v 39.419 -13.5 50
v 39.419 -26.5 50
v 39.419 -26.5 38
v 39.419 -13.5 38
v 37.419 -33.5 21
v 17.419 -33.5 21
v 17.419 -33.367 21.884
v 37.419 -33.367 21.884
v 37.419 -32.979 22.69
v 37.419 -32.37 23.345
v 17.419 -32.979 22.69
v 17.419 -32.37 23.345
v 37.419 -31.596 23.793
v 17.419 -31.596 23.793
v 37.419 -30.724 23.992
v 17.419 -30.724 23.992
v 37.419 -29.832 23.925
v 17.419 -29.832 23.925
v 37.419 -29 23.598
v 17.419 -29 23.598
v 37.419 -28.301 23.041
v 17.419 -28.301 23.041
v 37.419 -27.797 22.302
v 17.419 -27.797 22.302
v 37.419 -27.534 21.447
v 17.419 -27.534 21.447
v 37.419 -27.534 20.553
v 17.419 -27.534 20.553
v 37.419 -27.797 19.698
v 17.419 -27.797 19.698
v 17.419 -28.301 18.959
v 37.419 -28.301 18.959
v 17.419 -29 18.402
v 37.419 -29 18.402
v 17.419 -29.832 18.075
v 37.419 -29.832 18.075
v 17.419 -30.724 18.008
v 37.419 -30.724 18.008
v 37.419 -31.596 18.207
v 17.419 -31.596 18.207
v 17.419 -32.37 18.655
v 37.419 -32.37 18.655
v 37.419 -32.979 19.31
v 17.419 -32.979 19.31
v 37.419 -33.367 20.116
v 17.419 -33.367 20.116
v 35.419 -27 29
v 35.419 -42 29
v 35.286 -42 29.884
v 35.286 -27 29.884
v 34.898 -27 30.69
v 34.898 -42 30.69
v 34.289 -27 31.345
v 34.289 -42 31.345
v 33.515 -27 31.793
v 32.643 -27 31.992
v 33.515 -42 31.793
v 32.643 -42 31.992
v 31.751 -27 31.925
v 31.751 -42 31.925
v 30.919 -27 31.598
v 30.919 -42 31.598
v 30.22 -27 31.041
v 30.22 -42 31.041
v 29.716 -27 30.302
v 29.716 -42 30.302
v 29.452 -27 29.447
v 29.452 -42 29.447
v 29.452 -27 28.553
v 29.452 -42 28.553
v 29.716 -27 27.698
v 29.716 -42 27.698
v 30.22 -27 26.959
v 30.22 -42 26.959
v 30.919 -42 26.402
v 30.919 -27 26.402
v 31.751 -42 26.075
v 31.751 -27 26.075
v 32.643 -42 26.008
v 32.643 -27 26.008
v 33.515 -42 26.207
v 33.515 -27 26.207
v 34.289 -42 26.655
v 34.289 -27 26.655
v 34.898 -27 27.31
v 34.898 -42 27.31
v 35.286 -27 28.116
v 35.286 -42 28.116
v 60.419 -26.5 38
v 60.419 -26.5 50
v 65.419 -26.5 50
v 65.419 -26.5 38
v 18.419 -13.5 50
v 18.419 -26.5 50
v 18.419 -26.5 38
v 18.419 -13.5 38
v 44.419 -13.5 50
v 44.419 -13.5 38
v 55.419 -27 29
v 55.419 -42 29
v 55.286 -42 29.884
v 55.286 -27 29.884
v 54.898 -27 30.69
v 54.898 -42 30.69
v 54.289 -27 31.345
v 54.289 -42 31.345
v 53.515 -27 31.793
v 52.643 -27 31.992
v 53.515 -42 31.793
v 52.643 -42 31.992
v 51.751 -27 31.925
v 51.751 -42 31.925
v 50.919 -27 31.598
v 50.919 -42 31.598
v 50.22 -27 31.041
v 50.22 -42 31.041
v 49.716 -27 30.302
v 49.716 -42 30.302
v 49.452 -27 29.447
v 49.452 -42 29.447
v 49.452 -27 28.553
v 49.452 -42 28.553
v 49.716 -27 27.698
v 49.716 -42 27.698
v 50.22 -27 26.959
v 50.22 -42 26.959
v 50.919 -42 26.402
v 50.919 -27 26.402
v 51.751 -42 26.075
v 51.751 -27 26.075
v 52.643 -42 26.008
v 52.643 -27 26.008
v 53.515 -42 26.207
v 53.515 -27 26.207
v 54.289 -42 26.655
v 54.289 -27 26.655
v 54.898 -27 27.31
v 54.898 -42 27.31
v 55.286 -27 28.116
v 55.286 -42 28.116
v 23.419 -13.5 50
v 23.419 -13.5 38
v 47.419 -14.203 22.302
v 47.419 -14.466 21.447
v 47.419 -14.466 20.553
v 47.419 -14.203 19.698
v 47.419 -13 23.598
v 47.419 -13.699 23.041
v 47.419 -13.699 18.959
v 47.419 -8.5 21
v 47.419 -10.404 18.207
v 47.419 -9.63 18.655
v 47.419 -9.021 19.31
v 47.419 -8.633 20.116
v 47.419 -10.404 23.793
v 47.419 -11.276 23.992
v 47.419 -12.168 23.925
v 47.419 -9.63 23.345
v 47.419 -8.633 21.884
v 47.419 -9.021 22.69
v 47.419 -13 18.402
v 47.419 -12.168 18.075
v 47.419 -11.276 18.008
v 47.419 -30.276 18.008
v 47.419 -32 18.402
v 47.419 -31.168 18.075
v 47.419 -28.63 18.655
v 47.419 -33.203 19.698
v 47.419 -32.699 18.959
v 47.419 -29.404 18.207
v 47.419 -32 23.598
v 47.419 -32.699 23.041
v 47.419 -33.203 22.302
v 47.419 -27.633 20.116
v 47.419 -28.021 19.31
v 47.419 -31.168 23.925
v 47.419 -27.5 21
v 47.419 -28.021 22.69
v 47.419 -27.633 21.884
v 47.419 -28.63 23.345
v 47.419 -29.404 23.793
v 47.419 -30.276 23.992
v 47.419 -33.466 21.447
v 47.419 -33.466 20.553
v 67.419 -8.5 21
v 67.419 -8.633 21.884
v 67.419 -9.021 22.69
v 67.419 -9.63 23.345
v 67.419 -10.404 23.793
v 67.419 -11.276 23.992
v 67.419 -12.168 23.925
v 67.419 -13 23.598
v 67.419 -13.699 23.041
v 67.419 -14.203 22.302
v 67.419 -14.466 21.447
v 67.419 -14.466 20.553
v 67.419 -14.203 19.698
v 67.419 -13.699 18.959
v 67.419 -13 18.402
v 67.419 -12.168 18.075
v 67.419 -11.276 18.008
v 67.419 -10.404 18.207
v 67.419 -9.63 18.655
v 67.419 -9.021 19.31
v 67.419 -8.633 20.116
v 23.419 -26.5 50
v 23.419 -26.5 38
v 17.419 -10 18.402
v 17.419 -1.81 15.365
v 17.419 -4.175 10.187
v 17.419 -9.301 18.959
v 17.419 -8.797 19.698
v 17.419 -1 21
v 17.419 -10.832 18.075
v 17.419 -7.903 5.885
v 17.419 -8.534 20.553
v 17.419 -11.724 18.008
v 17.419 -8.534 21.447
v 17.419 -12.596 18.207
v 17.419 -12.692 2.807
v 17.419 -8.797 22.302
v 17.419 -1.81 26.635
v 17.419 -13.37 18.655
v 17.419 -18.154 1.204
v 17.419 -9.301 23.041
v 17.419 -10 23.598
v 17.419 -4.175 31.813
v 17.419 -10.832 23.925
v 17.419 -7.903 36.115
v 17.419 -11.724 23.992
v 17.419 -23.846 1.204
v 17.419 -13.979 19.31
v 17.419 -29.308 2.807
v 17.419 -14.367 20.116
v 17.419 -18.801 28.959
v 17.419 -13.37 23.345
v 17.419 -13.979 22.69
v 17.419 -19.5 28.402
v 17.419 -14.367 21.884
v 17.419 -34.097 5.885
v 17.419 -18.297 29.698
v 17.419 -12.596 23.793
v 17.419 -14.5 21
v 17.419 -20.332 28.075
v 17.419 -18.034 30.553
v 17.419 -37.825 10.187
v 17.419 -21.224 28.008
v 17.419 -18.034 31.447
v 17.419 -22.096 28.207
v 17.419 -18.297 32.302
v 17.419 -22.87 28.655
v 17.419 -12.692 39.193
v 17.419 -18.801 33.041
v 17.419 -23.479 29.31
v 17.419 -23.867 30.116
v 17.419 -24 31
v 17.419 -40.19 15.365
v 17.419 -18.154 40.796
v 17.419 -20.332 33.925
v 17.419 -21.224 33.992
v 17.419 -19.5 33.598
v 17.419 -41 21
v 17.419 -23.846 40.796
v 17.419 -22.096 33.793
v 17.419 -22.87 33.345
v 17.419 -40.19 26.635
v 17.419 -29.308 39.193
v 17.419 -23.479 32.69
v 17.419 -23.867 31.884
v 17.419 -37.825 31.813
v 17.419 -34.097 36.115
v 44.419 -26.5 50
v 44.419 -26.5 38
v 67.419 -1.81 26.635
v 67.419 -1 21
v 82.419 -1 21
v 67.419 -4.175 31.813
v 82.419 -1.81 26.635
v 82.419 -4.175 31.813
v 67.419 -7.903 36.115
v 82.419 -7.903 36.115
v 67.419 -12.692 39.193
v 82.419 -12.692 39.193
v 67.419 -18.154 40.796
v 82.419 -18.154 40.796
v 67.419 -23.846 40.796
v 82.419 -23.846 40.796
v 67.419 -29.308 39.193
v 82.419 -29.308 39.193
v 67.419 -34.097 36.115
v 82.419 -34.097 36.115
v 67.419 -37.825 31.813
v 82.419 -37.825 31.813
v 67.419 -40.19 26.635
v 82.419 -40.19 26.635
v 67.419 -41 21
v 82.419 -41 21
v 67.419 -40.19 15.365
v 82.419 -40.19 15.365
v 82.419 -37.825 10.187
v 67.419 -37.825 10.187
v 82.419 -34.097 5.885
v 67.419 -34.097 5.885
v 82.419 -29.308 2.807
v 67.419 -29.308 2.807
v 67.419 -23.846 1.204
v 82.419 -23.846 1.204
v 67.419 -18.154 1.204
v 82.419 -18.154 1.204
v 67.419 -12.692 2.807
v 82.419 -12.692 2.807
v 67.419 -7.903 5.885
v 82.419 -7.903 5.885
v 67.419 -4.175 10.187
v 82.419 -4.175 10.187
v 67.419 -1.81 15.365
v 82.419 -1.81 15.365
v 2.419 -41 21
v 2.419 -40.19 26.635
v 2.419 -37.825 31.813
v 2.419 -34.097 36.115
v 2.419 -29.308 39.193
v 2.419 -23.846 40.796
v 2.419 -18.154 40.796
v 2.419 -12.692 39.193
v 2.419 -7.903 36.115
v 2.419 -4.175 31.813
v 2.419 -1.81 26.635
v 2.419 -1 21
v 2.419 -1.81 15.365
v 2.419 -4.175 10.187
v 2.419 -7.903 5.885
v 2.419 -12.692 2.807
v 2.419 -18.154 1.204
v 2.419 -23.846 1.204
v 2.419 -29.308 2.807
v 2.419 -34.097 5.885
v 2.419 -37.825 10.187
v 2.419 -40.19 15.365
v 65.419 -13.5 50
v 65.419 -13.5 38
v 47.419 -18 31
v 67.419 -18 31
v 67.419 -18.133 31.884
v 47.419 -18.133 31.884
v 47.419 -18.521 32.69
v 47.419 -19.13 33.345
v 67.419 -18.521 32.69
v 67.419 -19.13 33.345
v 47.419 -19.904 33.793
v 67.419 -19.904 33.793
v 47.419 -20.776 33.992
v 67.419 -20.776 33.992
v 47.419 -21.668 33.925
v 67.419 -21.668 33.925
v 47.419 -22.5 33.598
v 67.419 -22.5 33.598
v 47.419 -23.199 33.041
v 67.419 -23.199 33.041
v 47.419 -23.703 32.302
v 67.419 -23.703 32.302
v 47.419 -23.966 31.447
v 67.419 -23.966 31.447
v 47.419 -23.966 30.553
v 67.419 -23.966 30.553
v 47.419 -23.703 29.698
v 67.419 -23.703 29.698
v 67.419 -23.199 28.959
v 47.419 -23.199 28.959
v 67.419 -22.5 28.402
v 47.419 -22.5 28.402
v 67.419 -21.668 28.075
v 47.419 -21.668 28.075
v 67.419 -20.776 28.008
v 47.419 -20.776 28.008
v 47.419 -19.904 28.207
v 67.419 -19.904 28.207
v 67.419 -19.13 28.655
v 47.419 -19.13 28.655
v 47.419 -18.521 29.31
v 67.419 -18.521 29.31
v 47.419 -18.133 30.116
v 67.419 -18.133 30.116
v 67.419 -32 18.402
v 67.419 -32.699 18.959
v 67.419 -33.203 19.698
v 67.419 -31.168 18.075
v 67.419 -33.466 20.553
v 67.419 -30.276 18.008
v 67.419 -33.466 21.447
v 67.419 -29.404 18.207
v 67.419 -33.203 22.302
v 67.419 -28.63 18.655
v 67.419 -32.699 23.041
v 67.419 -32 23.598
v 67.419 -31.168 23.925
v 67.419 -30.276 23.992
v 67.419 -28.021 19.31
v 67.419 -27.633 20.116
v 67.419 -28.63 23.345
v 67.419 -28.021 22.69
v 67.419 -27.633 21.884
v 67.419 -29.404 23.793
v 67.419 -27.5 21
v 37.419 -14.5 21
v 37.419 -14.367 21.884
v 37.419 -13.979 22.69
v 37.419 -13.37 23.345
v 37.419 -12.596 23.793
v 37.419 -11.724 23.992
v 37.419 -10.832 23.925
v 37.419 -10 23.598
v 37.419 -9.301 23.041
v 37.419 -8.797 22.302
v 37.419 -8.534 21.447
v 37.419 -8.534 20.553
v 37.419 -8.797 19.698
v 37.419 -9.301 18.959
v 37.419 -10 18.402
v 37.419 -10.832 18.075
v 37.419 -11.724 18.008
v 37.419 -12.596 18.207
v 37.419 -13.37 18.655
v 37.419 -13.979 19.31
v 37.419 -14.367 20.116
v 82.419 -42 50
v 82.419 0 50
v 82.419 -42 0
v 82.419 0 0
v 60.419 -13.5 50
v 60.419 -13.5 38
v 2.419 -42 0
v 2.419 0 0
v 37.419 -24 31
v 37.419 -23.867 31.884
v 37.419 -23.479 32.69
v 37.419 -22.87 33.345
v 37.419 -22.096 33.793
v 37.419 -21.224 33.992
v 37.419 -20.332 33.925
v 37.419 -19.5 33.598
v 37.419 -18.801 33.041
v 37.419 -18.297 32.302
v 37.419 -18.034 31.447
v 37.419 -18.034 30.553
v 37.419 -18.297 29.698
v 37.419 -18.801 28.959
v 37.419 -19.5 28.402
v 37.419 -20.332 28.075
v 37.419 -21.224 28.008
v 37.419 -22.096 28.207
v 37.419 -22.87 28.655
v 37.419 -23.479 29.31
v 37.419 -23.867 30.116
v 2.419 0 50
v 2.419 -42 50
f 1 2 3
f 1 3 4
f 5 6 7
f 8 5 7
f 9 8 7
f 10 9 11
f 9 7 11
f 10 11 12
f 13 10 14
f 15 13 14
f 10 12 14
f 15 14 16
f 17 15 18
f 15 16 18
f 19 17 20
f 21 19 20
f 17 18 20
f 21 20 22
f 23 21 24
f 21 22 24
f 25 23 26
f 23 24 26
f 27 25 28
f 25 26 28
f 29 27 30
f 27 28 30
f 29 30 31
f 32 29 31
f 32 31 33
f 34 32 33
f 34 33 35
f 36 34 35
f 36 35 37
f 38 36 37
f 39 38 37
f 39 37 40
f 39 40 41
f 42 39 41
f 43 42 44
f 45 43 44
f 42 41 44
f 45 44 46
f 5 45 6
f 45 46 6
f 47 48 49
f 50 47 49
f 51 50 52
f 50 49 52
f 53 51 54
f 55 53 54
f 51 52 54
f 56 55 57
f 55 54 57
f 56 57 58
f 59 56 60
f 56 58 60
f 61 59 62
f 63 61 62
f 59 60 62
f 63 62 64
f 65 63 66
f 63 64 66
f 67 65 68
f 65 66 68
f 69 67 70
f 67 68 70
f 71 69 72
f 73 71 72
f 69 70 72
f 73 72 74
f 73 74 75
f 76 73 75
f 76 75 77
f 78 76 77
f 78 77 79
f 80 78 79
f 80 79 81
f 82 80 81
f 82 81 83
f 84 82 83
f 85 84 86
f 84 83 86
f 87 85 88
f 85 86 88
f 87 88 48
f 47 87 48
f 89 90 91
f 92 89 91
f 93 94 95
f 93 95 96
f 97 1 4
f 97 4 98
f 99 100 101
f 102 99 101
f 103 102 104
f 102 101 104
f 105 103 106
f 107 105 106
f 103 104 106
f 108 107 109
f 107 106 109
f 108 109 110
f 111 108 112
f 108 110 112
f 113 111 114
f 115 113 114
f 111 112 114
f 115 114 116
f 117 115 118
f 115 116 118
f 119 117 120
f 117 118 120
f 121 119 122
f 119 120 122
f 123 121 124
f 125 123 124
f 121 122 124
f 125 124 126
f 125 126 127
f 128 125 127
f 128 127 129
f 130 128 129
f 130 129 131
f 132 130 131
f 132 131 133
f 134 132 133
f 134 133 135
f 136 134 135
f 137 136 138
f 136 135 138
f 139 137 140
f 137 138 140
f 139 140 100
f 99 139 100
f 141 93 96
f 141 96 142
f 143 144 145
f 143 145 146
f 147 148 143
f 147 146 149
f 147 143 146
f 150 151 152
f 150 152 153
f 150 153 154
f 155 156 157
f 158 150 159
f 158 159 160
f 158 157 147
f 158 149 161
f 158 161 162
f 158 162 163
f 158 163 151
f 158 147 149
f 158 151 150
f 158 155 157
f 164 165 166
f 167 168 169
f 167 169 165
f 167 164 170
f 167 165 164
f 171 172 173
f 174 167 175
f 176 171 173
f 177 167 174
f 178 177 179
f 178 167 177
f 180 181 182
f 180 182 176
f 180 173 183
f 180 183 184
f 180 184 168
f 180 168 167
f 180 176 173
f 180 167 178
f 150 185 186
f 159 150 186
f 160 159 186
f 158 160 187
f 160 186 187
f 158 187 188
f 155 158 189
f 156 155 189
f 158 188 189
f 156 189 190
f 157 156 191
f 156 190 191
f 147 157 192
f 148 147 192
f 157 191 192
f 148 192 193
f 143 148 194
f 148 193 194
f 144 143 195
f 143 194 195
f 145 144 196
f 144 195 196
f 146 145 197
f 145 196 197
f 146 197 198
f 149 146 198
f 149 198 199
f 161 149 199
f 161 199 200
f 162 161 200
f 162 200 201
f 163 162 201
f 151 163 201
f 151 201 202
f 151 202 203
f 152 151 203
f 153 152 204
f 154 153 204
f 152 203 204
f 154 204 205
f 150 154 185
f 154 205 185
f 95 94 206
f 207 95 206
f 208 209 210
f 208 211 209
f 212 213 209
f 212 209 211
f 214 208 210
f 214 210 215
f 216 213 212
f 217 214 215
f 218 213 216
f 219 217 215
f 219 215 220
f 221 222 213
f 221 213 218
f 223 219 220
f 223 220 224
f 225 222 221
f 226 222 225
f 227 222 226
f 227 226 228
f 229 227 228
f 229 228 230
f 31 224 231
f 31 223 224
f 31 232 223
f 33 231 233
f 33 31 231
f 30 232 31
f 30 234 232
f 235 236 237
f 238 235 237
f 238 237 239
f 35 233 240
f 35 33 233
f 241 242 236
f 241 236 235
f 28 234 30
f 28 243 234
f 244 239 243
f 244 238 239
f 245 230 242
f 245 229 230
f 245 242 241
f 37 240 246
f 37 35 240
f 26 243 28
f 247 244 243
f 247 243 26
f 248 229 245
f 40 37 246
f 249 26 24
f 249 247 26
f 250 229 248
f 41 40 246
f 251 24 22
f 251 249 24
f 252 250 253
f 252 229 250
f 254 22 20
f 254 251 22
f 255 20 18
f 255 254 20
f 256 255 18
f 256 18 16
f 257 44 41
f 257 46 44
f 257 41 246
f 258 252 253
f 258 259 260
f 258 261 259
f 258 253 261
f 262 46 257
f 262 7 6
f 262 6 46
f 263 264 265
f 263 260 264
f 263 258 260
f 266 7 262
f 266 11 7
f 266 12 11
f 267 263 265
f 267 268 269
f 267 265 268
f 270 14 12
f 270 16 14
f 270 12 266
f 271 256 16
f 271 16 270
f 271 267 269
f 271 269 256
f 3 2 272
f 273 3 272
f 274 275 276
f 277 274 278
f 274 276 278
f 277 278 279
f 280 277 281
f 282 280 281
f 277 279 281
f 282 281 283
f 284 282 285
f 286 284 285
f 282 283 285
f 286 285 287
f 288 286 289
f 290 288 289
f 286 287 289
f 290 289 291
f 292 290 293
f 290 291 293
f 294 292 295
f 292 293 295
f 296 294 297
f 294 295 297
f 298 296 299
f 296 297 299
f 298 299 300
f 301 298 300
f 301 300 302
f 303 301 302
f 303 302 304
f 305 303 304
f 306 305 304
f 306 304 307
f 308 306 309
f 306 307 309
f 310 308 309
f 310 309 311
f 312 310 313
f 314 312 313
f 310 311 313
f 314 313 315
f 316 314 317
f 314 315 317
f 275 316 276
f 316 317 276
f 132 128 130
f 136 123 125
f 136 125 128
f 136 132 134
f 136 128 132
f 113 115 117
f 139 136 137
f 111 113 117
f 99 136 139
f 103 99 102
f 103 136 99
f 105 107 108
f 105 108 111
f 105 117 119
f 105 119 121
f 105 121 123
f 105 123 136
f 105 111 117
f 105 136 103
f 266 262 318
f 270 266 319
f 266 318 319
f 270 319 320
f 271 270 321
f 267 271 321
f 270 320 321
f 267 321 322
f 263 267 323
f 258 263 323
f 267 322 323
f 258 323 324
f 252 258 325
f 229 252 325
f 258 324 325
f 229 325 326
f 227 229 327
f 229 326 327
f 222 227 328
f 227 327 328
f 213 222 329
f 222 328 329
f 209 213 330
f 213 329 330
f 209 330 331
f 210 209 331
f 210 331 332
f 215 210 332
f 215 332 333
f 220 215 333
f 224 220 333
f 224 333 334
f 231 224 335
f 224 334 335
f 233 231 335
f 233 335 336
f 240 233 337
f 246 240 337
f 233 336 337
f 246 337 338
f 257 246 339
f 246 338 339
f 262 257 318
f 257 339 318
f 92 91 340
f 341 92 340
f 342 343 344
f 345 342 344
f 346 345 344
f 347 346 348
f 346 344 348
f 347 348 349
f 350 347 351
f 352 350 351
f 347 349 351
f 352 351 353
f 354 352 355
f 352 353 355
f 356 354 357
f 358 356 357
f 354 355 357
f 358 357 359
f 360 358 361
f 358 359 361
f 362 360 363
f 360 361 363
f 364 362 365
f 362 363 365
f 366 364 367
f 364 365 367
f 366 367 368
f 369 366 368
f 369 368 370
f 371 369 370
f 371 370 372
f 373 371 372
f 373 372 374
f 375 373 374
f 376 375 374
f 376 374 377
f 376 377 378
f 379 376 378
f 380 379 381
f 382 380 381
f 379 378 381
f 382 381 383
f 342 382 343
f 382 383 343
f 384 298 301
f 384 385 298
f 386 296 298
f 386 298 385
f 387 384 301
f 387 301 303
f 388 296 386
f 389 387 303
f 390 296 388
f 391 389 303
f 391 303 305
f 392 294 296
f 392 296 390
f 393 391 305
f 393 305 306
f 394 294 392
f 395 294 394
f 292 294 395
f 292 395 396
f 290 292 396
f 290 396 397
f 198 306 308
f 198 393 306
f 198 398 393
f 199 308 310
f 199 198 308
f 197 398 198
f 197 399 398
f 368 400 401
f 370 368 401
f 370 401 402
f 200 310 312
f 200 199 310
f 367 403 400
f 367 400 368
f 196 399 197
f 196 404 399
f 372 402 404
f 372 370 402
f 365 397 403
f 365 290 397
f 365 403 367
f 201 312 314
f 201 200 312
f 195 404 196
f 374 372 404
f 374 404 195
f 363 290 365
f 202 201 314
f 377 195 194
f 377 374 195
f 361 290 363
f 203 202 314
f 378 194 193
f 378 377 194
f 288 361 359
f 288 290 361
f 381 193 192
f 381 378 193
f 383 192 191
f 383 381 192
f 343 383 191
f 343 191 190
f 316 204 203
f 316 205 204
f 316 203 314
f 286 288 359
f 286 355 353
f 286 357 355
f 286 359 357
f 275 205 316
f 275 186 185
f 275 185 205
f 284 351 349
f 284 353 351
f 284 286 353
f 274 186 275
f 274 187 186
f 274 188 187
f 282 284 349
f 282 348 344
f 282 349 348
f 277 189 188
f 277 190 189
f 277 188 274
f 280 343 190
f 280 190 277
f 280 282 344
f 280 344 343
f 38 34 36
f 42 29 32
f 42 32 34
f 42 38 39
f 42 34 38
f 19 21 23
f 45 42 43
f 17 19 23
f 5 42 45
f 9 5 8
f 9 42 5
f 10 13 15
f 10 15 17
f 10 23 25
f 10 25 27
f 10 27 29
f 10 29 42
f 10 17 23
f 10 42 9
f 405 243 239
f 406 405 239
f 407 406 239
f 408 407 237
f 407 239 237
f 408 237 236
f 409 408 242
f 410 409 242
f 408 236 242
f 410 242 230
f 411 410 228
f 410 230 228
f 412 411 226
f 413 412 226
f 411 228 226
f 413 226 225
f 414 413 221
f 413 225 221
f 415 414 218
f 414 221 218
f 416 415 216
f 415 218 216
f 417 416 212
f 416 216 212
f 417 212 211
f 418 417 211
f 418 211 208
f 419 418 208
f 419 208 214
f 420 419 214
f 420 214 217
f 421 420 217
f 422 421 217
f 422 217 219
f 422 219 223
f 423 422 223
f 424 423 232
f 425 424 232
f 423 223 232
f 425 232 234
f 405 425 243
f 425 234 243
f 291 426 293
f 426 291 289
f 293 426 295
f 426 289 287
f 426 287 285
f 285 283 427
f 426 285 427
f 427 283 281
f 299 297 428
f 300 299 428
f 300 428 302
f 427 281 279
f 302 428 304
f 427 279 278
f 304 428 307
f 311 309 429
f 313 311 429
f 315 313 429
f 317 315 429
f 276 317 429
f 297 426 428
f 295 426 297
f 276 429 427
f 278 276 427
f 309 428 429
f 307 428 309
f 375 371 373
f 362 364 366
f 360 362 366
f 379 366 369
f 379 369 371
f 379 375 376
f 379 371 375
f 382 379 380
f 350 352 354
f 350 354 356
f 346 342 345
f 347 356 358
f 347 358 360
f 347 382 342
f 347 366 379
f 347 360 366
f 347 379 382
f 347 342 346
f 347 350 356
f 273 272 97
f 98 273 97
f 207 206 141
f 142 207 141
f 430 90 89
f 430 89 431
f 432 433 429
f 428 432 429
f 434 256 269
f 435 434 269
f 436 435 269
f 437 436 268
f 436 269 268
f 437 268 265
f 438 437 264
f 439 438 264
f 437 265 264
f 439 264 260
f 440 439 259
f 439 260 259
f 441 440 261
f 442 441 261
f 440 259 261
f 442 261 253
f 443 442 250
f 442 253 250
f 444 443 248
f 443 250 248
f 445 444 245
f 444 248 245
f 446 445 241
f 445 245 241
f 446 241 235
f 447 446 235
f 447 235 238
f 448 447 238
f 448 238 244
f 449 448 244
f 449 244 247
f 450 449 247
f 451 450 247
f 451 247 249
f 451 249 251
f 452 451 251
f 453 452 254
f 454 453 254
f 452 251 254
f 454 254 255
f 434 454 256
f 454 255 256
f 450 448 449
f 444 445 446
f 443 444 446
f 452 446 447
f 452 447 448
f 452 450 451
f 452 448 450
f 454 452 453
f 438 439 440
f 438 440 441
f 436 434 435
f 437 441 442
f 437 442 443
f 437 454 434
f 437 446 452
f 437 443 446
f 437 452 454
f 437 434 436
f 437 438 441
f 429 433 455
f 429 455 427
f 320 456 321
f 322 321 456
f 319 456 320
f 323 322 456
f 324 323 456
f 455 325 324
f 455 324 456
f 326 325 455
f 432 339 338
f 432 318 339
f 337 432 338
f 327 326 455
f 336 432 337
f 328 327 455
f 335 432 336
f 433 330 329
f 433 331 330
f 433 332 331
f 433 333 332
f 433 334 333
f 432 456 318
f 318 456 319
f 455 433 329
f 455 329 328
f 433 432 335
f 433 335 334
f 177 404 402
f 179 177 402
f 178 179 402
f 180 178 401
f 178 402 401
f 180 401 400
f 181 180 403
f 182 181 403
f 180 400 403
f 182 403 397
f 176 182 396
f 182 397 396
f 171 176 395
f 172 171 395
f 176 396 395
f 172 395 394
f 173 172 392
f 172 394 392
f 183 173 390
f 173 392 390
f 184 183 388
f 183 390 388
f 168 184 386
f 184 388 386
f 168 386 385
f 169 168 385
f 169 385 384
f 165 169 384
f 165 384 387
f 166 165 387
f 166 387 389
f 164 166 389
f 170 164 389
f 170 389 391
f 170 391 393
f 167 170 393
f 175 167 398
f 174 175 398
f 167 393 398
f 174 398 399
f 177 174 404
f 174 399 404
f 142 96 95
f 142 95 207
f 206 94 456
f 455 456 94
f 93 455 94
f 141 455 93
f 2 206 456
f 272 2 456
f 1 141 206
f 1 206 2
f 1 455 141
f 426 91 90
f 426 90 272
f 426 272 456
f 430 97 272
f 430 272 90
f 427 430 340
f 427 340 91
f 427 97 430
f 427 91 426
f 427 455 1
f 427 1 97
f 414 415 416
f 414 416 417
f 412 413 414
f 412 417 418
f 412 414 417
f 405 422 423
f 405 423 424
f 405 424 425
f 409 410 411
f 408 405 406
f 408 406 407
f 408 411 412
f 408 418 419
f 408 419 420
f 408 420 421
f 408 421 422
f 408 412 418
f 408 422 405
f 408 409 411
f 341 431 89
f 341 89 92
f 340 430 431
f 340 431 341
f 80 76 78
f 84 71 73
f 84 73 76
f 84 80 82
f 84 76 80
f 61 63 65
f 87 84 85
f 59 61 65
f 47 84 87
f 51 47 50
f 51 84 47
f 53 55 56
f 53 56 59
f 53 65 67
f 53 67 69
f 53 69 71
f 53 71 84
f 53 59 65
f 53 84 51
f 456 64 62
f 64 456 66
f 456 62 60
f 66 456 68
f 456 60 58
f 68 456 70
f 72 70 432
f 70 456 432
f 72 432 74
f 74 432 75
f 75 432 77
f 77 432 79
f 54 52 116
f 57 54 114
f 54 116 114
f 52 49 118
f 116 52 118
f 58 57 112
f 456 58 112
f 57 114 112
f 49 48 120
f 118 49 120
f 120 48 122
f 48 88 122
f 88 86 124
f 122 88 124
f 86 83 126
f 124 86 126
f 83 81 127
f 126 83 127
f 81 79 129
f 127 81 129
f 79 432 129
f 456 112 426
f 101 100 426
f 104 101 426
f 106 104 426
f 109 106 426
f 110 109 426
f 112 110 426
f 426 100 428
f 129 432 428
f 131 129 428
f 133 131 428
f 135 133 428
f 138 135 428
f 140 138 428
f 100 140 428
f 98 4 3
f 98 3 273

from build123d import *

# Parameters (mm, degrees)
F0_W      = 80
F0_H      = 42
F1_DEPTH  = 50
F2_W      = 5
F2_H      = 13
F3_DEPTH  = 12
F4_W      = 5
F4_H      = 13
F5_DEPTH  = 12
F6_W      = 5
F6_H      = 13
F7_DEPTH  = 12
F8_R      = 20
F9_DEPTH  = 15
F10_R     = 3
F11_DEPTH = 20
F12_R     = 3
F13_DEPTH = 20
F14_R     = 3
F15_DEPTH = 20
F16_R     = 20
F17_DEPTH = 15
F18_R     = 3
F19_DEPTH = 20
F20_R     = 3
F21_DEPTH = 20
F22_R     = 3
F23_DEPTH = 20
F24_R     = 3
F25_DEPTH = 15
F26_R     = 3
F27_DEPTH = 15


with BuildPart() as f1:
    # F0 (on Top) → F1 (new body)
    with BuildSketch(Plane.XY):
        with Locations((42.418869, -21)):
            Rectangle(F0_W, F0_H)
    extrude(amount=F1_DEPTH)

    # F2 (on face) → F3 (cut)
    with BuildSketch(Plane.XY.offset(50)):
        with Locations((20.918869, -20)):
            Rectangle(F2_W, F2_H)
    extrude(amount=-F3_DEPTH, mode=Mode.SUBTRACT)

    # F4 (on face) → F5 (cut)
    with BuildSketch(Plane.XY.offset(50)):
        with Locations((41.918869, -20)):
            Rectangle(F4_W, F4_H)
    extrude(amount=-F5_DEPTH, mode=Mode.SUBTRACT)

    # F6 (on face) → F7 (cut)
    with BuildSketch(Plane.XY.offset(50)):
        with Locations((62.918869, -20)):
            Rectangle(F6_W, F6_H)
    extrude(amount=-F7_DEPTH, mode=Mode.SUBTRACT)

    # F8 (on face) → F9 (cut)
    with BuildSketch(Plane.YZ.offset(82.418869)):
        with Locations((-21, 21)):
            Circle(F8_R)
    extrude(amount=-F9_DEPTH, mode=Mode.SUBTRACT)

    # F10 (on face) → F11 (cut)
    with BuildSketch(Plane.YZ.offset(67.418869)):
        with Locations((-11.5, 21)):
            Circle(F10_R)
    extrude(amount=-F11_DEPTH, mode=Mode.SUBTRACT)

    # F12 (on face) → F13 (cut)
    with BuildSketch(Plane.YZ.offset(67.418869)):
        with Locations((-30.5, 21)):
            Circle(F12_R)
    extrude(amount=-F13_DEPTH, mode=Mode.SUBTRACT)

    # F14 (on face) → F15 (cut)
    with BuildSketch(Plane.YZ.offset(67.418869)):
        with Locations((-21, 31)):
            Circle(F14_R)
    extrude(amount=-F15_DEPTH, mode=Mode.SUBTRACT)

    # F16 (on face) → F17 (cut)
    with BuildSketch(Plane(origin=(2.418869, 0, 0), x_dir=(0, -1, 0), z_dir=(-1, 0, 0))):
        with Locations((21, 21)):
            Circle(F16_R)
    extrude(amount=-F17_DEPTH, mode=Mode.SUBTRACT)

    # F18 (on face) → F19 (cut)
    with BuildSketch(Plane(origin=(17.418869, 0, 0), x_dir=(0, -1, 0), z_dir=(-1, 0, 0))):
        with Locations((30.5, 21)):
            Circle(F18_R)
    extrude(amount=-F19_DEPTH, mode=Mode.SUBTRACT)

    # F20 (on face) → F21 (cut)
    with BuildSketch(Plane(origin=(17.418869, 0, 0), x_dir=(0, -1, 0), z_dir=(-1, 0, 0))):
        with Locations((11.5, 21)):
            Circle(F20_R)
    extrude(amount=-F21_DEPTH, mode=Mode.SUBTRACT)

    # F22 (on face) → F23 (cut)
    with BuildSketch(Plane(origin=(17.418869, 0, 0), x_dir=(0, -1, 0), z_dir=(-1, 0, 0))):
        with Locations((21, 31)):
            Circle(F22_R)
    extrude(amount=-F23_DEPTH, mode=Mode.SUBTRACT)

    # F24 (on face) → F25 (cut)
    with BuildSketch(Plane.XZ.offset(42)):
        with Locations((32.418869, 29)):
            Circle(F24_R)
    extrude(amount=-F25_DEPTH, mode=Mode.SUBTRACT)

    # F26 (on face) → F27 (cut)
    with BuildSketch(Plane.XZ.offset(42)):
        with Locations((52.418869, 29)):
            Circle(F26_R)
    extrude(amount=-F27_DEPTH, mode=Mode.SUBTRACT)


solid = f1.part
